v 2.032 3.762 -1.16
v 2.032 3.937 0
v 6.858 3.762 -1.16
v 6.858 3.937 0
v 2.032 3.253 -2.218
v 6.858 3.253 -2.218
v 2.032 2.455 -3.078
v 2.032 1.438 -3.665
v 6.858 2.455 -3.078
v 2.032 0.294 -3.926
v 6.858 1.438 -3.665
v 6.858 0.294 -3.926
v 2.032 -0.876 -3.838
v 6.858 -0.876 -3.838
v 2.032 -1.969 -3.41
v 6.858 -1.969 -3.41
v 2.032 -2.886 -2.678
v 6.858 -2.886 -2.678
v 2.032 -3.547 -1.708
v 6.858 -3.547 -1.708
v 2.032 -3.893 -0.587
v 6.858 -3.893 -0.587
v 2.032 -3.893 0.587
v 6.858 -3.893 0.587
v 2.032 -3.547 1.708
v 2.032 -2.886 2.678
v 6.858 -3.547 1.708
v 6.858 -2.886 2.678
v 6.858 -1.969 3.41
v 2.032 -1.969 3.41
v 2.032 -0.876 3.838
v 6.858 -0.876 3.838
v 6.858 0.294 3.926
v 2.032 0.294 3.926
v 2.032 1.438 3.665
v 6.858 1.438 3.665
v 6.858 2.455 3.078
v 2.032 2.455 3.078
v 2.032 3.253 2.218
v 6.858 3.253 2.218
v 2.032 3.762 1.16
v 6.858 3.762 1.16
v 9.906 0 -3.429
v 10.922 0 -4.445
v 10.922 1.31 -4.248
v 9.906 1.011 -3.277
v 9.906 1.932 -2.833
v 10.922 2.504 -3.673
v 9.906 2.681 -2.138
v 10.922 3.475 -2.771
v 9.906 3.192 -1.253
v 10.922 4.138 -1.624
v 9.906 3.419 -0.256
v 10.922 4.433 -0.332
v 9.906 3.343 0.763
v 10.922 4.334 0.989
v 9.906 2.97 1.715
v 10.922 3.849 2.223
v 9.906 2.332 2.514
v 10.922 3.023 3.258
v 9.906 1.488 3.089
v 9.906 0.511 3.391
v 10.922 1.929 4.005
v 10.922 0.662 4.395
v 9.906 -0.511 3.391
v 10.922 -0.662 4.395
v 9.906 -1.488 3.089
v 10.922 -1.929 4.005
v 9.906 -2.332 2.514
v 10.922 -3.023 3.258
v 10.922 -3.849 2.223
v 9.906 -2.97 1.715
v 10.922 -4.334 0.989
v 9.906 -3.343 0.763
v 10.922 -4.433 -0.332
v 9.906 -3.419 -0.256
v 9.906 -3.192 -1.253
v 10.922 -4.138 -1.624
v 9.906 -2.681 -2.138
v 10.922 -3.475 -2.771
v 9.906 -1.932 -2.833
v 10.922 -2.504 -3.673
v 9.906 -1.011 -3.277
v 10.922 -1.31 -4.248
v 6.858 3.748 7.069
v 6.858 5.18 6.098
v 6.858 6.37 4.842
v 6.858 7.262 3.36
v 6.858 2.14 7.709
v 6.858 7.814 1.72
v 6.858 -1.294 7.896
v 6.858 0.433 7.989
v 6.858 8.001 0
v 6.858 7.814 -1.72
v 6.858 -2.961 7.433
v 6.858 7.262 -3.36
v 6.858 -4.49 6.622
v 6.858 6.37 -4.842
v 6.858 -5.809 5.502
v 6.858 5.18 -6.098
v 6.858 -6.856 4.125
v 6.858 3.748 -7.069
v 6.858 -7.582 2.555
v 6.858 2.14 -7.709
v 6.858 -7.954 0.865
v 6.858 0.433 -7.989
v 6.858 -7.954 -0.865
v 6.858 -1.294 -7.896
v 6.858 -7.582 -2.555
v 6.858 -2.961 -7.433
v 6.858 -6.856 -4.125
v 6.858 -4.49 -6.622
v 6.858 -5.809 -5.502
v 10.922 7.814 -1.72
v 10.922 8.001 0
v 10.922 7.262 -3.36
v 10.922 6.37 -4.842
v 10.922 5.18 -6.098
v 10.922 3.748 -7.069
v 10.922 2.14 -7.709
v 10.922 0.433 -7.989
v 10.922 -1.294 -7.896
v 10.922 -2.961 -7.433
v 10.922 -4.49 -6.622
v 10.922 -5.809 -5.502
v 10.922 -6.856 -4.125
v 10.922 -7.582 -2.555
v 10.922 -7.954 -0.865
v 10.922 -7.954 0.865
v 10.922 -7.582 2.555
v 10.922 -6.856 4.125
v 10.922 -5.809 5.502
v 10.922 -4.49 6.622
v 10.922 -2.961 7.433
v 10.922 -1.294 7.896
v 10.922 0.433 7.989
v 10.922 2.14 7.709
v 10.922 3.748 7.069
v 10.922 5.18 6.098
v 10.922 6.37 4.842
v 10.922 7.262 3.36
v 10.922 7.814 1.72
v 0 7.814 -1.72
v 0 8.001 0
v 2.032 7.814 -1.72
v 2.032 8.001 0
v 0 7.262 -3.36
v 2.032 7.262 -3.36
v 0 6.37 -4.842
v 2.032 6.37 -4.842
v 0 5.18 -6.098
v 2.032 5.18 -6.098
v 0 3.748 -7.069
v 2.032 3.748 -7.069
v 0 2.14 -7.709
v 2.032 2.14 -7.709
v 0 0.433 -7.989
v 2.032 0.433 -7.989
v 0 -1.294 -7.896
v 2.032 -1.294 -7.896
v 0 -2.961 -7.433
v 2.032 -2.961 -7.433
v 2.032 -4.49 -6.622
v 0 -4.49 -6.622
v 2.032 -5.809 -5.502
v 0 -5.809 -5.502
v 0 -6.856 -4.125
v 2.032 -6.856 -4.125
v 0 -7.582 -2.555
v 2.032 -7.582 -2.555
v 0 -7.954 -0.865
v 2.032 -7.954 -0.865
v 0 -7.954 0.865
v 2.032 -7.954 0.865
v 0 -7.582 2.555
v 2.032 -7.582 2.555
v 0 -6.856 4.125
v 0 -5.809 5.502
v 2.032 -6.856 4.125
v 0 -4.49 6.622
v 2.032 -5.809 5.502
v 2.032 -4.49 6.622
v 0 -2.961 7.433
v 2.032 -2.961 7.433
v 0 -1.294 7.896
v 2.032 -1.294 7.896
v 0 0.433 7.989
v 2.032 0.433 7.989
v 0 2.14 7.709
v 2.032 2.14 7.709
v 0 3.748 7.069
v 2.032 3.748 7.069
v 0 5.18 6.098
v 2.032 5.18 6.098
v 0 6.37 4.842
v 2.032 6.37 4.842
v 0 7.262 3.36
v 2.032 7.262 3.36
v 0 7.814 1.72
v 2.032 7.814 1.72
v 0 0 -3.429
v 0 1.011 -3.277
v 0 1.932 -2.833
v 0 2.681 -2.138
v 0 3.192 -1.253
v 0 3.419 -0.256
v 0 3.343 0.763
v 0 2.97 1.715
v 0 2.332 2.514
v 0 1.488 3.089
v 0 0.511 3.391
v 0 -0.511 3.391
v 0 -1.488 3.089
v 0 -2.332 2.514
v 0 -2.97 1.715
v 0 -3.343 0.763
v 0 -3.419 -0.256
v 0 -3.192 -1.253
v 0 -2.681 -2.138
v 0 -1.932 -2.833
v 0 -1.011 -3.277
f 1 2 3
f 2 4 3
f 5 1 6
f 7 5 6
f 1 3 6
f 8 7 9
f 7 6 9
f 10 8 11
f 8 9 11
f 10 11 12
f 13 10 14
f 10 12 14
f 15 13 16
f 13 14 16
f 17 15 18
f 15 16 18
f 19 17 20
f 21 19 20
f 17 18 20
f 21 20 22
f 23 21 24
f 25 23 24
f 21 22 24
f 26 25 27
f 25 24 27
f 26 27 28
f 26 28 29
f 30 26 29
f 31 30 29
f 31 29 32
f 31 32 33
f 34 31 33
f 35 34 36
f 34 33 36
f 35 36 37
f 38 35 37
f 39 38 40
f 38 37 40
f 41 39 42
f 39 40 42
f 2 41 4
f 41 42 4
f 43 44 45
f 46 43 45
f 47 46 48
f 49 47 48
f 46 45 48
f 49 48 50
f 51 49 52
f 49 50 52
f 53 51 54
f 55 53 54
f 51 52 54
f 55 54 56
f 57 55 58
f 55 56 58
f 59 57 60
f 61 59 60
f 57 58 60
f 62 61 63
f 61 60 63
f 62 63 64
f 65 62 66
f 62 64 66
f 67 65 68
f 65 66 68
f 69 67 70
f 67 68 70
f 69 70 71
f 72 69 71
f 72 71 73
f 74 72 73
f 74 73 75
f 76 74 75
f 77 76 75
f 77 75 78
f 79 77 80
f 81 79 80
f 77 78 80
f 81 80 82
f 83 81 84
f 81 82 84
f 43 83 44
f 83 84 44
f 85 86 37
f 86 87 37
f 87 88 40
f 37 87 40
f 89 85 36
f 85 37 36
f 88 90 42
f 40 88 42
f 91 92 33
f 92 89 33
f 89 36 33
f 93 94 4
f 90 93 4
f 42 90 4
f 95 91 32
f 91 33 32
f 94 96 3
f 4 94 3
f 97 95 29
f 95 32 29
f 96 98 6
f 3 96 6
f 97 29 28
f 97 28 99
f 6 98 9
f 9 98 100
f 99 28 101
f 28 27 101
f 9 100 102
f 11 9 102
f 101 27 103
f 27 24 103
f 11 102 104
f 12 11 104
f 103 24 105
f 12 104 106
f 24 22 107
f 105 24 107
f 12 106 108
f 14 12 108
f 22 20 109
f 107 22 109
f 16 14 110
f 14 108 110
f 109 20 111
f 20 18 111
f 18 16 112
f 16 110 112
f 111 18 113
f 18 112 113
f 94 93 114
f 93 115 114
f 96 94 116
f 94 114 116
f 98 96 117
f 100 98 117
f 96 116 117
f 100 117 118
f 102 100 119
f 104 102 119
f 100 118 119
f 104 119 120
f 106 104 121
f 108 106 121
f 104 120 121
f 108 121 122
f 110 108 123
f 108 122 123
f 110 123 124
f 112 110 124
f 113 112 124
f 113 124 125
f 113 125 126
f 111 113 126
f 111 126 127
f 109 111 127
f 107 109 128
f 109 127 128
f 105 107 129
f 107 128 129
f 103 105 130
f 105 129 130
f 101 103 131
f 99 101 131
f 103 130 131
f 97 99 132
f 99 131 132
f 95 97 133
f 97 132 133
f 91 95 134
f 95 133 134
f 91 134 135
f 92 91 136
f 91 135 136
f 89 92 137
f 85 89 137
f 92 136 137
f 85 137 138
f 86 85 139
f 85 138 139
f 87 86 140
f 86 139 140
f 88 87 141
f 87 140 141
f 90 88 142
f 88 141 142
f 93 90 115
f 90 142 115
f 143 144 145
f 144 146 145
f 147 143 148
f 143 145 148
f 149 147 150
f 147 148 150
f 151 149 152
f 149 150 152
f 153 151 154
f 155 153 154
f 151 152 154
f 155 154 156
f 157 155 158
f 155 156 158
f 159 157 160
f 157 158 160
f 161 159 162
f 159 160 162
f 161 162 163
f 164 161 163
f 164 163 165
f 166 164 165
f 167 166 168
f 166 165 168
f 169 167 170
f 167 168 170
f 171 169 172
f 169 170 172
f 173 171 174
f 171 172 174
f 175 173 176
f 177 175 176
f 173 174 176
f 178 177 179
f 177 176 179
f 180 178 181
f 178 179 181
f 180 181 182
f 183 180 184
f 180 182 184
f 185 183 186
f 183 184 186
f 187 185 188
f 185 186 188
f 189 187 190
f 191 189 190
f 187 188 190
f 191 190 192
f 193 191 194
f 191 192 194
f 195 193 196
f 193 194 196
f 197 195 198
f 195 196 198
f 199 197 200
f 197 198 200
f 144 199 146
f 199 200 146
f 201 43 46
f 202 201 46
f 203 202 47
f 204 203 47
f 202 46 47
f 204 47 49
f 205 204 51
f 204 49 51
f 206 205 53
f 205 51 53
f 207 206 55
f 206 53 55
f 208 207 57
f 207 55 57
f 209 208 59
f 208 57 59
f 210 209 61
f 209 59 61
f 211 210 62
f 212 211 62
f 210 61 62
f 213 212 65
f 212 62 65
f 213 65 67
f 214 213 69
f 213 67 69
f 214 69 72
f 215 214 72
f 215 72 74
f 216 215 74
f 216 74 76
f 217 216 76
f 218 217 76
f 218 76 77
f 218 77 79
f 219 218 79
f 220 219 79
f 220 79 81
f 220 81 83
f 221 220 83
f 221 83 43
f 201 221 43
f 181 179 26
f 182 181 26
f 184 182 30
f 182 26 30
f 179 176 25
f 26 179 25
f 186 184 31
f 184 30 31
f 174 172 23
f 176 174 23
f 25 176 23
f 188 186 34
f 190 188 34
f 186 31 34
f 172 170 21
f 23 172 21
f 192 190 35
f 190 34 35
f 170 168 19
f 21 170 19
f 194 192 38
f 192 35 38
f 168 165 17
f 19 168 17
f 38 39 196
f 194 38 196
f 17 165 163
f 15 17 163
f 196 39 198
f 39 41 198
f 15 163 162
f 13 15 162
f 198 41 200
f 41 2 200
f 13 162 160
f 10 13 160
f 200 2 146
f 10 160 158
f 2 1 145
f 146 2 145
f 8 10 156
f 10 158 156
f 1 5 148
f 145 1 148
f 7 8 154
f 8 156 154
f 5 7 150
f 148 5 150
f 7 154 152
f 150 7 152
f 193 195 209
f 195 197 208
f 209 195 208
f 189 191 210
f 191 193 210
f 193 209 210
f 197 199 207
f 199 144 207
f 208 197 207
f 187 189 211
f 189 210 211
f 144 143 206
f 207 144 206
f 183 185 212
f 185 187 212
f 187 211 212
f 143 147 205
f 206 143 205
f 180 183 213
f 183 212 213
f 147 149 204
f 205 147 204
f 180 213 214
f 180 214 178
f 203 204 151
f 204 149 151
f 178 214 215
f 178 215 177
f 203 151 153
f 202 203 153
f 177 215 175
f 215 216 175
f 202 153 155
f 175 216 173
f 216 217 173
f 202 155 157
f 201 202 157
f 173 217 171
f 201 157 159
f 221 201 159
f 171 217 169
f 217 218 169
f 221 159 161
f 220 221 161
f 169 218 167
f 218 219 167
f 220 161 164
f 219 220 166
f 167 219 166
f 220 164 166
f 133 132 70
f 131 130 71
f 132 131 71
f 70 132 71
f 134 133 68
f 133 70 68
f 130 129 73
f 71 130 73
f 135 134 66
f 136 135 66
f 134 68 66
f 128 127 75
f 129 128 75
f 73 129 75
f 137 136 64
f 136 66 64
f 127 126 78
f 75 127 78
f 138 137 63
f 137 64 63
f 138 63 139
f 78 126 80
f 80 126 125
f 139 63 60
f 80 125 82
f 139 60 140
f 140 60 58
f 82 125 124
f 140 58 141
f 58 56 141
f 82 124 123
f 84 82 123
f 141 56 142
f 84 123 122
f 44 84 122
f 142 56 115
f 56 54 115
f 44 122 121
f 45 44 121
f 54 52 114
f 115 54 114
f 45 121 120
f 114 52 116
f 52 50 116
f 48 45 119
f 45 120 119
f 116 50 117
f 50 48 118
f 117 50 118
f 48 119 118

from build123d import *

# Parameters (mm, degrees)
SKETCH3_R               = 3.429
CUT_EXTRUDE1_DEPTH      = 1
CUT_EXTRUDE1_DEPTH_BACK = 11.922
CHAMFER1_SIZE           = 1.016


with BuildPart() as part:
    # Sketch2 → Revolve1 (revolve)
    with BuildSketch(Plane.XY):
        Polygon((10.922, 0), (0, 0), (0, 8.001), (2.032, 8.001), (2.032, 3.937), (6.858, 3.937), (6.858, 8.001), (10.922, 8.001), align=None)
    revolve(axis=Axis((10.922, 0, 0), (-1, 0, 0)))

    # Sketch3 → Cut-Extrude1 (cut, two sides)
    with BuildSketch(Plane(origin=(10.922, 0, 0), x_dir=(0, 0, -1), z_dir=(1, 0, 0))) as cut_extrude1_sk:
        Circle(SKETCH3_R)
    extrude(amount=CUT_EXTRUDE1_DEPTH, mode=Mode.SUBTRACT)
    extrude(cut_extrude1_sk.sketch, amount=-CUT_EXTRUDE1_DEPTH_BACK, mode=Mode.SUBTRACT)

    # Chamfer1
    chamfer1_edges = [part.edges().sort_by_distance(p)[0] for p in [
        (10.922, 0, 3.429),
    ]]
    chamfer(chamfer1_edges, length=CHAMFER1_SIZE)


solid = part.part
